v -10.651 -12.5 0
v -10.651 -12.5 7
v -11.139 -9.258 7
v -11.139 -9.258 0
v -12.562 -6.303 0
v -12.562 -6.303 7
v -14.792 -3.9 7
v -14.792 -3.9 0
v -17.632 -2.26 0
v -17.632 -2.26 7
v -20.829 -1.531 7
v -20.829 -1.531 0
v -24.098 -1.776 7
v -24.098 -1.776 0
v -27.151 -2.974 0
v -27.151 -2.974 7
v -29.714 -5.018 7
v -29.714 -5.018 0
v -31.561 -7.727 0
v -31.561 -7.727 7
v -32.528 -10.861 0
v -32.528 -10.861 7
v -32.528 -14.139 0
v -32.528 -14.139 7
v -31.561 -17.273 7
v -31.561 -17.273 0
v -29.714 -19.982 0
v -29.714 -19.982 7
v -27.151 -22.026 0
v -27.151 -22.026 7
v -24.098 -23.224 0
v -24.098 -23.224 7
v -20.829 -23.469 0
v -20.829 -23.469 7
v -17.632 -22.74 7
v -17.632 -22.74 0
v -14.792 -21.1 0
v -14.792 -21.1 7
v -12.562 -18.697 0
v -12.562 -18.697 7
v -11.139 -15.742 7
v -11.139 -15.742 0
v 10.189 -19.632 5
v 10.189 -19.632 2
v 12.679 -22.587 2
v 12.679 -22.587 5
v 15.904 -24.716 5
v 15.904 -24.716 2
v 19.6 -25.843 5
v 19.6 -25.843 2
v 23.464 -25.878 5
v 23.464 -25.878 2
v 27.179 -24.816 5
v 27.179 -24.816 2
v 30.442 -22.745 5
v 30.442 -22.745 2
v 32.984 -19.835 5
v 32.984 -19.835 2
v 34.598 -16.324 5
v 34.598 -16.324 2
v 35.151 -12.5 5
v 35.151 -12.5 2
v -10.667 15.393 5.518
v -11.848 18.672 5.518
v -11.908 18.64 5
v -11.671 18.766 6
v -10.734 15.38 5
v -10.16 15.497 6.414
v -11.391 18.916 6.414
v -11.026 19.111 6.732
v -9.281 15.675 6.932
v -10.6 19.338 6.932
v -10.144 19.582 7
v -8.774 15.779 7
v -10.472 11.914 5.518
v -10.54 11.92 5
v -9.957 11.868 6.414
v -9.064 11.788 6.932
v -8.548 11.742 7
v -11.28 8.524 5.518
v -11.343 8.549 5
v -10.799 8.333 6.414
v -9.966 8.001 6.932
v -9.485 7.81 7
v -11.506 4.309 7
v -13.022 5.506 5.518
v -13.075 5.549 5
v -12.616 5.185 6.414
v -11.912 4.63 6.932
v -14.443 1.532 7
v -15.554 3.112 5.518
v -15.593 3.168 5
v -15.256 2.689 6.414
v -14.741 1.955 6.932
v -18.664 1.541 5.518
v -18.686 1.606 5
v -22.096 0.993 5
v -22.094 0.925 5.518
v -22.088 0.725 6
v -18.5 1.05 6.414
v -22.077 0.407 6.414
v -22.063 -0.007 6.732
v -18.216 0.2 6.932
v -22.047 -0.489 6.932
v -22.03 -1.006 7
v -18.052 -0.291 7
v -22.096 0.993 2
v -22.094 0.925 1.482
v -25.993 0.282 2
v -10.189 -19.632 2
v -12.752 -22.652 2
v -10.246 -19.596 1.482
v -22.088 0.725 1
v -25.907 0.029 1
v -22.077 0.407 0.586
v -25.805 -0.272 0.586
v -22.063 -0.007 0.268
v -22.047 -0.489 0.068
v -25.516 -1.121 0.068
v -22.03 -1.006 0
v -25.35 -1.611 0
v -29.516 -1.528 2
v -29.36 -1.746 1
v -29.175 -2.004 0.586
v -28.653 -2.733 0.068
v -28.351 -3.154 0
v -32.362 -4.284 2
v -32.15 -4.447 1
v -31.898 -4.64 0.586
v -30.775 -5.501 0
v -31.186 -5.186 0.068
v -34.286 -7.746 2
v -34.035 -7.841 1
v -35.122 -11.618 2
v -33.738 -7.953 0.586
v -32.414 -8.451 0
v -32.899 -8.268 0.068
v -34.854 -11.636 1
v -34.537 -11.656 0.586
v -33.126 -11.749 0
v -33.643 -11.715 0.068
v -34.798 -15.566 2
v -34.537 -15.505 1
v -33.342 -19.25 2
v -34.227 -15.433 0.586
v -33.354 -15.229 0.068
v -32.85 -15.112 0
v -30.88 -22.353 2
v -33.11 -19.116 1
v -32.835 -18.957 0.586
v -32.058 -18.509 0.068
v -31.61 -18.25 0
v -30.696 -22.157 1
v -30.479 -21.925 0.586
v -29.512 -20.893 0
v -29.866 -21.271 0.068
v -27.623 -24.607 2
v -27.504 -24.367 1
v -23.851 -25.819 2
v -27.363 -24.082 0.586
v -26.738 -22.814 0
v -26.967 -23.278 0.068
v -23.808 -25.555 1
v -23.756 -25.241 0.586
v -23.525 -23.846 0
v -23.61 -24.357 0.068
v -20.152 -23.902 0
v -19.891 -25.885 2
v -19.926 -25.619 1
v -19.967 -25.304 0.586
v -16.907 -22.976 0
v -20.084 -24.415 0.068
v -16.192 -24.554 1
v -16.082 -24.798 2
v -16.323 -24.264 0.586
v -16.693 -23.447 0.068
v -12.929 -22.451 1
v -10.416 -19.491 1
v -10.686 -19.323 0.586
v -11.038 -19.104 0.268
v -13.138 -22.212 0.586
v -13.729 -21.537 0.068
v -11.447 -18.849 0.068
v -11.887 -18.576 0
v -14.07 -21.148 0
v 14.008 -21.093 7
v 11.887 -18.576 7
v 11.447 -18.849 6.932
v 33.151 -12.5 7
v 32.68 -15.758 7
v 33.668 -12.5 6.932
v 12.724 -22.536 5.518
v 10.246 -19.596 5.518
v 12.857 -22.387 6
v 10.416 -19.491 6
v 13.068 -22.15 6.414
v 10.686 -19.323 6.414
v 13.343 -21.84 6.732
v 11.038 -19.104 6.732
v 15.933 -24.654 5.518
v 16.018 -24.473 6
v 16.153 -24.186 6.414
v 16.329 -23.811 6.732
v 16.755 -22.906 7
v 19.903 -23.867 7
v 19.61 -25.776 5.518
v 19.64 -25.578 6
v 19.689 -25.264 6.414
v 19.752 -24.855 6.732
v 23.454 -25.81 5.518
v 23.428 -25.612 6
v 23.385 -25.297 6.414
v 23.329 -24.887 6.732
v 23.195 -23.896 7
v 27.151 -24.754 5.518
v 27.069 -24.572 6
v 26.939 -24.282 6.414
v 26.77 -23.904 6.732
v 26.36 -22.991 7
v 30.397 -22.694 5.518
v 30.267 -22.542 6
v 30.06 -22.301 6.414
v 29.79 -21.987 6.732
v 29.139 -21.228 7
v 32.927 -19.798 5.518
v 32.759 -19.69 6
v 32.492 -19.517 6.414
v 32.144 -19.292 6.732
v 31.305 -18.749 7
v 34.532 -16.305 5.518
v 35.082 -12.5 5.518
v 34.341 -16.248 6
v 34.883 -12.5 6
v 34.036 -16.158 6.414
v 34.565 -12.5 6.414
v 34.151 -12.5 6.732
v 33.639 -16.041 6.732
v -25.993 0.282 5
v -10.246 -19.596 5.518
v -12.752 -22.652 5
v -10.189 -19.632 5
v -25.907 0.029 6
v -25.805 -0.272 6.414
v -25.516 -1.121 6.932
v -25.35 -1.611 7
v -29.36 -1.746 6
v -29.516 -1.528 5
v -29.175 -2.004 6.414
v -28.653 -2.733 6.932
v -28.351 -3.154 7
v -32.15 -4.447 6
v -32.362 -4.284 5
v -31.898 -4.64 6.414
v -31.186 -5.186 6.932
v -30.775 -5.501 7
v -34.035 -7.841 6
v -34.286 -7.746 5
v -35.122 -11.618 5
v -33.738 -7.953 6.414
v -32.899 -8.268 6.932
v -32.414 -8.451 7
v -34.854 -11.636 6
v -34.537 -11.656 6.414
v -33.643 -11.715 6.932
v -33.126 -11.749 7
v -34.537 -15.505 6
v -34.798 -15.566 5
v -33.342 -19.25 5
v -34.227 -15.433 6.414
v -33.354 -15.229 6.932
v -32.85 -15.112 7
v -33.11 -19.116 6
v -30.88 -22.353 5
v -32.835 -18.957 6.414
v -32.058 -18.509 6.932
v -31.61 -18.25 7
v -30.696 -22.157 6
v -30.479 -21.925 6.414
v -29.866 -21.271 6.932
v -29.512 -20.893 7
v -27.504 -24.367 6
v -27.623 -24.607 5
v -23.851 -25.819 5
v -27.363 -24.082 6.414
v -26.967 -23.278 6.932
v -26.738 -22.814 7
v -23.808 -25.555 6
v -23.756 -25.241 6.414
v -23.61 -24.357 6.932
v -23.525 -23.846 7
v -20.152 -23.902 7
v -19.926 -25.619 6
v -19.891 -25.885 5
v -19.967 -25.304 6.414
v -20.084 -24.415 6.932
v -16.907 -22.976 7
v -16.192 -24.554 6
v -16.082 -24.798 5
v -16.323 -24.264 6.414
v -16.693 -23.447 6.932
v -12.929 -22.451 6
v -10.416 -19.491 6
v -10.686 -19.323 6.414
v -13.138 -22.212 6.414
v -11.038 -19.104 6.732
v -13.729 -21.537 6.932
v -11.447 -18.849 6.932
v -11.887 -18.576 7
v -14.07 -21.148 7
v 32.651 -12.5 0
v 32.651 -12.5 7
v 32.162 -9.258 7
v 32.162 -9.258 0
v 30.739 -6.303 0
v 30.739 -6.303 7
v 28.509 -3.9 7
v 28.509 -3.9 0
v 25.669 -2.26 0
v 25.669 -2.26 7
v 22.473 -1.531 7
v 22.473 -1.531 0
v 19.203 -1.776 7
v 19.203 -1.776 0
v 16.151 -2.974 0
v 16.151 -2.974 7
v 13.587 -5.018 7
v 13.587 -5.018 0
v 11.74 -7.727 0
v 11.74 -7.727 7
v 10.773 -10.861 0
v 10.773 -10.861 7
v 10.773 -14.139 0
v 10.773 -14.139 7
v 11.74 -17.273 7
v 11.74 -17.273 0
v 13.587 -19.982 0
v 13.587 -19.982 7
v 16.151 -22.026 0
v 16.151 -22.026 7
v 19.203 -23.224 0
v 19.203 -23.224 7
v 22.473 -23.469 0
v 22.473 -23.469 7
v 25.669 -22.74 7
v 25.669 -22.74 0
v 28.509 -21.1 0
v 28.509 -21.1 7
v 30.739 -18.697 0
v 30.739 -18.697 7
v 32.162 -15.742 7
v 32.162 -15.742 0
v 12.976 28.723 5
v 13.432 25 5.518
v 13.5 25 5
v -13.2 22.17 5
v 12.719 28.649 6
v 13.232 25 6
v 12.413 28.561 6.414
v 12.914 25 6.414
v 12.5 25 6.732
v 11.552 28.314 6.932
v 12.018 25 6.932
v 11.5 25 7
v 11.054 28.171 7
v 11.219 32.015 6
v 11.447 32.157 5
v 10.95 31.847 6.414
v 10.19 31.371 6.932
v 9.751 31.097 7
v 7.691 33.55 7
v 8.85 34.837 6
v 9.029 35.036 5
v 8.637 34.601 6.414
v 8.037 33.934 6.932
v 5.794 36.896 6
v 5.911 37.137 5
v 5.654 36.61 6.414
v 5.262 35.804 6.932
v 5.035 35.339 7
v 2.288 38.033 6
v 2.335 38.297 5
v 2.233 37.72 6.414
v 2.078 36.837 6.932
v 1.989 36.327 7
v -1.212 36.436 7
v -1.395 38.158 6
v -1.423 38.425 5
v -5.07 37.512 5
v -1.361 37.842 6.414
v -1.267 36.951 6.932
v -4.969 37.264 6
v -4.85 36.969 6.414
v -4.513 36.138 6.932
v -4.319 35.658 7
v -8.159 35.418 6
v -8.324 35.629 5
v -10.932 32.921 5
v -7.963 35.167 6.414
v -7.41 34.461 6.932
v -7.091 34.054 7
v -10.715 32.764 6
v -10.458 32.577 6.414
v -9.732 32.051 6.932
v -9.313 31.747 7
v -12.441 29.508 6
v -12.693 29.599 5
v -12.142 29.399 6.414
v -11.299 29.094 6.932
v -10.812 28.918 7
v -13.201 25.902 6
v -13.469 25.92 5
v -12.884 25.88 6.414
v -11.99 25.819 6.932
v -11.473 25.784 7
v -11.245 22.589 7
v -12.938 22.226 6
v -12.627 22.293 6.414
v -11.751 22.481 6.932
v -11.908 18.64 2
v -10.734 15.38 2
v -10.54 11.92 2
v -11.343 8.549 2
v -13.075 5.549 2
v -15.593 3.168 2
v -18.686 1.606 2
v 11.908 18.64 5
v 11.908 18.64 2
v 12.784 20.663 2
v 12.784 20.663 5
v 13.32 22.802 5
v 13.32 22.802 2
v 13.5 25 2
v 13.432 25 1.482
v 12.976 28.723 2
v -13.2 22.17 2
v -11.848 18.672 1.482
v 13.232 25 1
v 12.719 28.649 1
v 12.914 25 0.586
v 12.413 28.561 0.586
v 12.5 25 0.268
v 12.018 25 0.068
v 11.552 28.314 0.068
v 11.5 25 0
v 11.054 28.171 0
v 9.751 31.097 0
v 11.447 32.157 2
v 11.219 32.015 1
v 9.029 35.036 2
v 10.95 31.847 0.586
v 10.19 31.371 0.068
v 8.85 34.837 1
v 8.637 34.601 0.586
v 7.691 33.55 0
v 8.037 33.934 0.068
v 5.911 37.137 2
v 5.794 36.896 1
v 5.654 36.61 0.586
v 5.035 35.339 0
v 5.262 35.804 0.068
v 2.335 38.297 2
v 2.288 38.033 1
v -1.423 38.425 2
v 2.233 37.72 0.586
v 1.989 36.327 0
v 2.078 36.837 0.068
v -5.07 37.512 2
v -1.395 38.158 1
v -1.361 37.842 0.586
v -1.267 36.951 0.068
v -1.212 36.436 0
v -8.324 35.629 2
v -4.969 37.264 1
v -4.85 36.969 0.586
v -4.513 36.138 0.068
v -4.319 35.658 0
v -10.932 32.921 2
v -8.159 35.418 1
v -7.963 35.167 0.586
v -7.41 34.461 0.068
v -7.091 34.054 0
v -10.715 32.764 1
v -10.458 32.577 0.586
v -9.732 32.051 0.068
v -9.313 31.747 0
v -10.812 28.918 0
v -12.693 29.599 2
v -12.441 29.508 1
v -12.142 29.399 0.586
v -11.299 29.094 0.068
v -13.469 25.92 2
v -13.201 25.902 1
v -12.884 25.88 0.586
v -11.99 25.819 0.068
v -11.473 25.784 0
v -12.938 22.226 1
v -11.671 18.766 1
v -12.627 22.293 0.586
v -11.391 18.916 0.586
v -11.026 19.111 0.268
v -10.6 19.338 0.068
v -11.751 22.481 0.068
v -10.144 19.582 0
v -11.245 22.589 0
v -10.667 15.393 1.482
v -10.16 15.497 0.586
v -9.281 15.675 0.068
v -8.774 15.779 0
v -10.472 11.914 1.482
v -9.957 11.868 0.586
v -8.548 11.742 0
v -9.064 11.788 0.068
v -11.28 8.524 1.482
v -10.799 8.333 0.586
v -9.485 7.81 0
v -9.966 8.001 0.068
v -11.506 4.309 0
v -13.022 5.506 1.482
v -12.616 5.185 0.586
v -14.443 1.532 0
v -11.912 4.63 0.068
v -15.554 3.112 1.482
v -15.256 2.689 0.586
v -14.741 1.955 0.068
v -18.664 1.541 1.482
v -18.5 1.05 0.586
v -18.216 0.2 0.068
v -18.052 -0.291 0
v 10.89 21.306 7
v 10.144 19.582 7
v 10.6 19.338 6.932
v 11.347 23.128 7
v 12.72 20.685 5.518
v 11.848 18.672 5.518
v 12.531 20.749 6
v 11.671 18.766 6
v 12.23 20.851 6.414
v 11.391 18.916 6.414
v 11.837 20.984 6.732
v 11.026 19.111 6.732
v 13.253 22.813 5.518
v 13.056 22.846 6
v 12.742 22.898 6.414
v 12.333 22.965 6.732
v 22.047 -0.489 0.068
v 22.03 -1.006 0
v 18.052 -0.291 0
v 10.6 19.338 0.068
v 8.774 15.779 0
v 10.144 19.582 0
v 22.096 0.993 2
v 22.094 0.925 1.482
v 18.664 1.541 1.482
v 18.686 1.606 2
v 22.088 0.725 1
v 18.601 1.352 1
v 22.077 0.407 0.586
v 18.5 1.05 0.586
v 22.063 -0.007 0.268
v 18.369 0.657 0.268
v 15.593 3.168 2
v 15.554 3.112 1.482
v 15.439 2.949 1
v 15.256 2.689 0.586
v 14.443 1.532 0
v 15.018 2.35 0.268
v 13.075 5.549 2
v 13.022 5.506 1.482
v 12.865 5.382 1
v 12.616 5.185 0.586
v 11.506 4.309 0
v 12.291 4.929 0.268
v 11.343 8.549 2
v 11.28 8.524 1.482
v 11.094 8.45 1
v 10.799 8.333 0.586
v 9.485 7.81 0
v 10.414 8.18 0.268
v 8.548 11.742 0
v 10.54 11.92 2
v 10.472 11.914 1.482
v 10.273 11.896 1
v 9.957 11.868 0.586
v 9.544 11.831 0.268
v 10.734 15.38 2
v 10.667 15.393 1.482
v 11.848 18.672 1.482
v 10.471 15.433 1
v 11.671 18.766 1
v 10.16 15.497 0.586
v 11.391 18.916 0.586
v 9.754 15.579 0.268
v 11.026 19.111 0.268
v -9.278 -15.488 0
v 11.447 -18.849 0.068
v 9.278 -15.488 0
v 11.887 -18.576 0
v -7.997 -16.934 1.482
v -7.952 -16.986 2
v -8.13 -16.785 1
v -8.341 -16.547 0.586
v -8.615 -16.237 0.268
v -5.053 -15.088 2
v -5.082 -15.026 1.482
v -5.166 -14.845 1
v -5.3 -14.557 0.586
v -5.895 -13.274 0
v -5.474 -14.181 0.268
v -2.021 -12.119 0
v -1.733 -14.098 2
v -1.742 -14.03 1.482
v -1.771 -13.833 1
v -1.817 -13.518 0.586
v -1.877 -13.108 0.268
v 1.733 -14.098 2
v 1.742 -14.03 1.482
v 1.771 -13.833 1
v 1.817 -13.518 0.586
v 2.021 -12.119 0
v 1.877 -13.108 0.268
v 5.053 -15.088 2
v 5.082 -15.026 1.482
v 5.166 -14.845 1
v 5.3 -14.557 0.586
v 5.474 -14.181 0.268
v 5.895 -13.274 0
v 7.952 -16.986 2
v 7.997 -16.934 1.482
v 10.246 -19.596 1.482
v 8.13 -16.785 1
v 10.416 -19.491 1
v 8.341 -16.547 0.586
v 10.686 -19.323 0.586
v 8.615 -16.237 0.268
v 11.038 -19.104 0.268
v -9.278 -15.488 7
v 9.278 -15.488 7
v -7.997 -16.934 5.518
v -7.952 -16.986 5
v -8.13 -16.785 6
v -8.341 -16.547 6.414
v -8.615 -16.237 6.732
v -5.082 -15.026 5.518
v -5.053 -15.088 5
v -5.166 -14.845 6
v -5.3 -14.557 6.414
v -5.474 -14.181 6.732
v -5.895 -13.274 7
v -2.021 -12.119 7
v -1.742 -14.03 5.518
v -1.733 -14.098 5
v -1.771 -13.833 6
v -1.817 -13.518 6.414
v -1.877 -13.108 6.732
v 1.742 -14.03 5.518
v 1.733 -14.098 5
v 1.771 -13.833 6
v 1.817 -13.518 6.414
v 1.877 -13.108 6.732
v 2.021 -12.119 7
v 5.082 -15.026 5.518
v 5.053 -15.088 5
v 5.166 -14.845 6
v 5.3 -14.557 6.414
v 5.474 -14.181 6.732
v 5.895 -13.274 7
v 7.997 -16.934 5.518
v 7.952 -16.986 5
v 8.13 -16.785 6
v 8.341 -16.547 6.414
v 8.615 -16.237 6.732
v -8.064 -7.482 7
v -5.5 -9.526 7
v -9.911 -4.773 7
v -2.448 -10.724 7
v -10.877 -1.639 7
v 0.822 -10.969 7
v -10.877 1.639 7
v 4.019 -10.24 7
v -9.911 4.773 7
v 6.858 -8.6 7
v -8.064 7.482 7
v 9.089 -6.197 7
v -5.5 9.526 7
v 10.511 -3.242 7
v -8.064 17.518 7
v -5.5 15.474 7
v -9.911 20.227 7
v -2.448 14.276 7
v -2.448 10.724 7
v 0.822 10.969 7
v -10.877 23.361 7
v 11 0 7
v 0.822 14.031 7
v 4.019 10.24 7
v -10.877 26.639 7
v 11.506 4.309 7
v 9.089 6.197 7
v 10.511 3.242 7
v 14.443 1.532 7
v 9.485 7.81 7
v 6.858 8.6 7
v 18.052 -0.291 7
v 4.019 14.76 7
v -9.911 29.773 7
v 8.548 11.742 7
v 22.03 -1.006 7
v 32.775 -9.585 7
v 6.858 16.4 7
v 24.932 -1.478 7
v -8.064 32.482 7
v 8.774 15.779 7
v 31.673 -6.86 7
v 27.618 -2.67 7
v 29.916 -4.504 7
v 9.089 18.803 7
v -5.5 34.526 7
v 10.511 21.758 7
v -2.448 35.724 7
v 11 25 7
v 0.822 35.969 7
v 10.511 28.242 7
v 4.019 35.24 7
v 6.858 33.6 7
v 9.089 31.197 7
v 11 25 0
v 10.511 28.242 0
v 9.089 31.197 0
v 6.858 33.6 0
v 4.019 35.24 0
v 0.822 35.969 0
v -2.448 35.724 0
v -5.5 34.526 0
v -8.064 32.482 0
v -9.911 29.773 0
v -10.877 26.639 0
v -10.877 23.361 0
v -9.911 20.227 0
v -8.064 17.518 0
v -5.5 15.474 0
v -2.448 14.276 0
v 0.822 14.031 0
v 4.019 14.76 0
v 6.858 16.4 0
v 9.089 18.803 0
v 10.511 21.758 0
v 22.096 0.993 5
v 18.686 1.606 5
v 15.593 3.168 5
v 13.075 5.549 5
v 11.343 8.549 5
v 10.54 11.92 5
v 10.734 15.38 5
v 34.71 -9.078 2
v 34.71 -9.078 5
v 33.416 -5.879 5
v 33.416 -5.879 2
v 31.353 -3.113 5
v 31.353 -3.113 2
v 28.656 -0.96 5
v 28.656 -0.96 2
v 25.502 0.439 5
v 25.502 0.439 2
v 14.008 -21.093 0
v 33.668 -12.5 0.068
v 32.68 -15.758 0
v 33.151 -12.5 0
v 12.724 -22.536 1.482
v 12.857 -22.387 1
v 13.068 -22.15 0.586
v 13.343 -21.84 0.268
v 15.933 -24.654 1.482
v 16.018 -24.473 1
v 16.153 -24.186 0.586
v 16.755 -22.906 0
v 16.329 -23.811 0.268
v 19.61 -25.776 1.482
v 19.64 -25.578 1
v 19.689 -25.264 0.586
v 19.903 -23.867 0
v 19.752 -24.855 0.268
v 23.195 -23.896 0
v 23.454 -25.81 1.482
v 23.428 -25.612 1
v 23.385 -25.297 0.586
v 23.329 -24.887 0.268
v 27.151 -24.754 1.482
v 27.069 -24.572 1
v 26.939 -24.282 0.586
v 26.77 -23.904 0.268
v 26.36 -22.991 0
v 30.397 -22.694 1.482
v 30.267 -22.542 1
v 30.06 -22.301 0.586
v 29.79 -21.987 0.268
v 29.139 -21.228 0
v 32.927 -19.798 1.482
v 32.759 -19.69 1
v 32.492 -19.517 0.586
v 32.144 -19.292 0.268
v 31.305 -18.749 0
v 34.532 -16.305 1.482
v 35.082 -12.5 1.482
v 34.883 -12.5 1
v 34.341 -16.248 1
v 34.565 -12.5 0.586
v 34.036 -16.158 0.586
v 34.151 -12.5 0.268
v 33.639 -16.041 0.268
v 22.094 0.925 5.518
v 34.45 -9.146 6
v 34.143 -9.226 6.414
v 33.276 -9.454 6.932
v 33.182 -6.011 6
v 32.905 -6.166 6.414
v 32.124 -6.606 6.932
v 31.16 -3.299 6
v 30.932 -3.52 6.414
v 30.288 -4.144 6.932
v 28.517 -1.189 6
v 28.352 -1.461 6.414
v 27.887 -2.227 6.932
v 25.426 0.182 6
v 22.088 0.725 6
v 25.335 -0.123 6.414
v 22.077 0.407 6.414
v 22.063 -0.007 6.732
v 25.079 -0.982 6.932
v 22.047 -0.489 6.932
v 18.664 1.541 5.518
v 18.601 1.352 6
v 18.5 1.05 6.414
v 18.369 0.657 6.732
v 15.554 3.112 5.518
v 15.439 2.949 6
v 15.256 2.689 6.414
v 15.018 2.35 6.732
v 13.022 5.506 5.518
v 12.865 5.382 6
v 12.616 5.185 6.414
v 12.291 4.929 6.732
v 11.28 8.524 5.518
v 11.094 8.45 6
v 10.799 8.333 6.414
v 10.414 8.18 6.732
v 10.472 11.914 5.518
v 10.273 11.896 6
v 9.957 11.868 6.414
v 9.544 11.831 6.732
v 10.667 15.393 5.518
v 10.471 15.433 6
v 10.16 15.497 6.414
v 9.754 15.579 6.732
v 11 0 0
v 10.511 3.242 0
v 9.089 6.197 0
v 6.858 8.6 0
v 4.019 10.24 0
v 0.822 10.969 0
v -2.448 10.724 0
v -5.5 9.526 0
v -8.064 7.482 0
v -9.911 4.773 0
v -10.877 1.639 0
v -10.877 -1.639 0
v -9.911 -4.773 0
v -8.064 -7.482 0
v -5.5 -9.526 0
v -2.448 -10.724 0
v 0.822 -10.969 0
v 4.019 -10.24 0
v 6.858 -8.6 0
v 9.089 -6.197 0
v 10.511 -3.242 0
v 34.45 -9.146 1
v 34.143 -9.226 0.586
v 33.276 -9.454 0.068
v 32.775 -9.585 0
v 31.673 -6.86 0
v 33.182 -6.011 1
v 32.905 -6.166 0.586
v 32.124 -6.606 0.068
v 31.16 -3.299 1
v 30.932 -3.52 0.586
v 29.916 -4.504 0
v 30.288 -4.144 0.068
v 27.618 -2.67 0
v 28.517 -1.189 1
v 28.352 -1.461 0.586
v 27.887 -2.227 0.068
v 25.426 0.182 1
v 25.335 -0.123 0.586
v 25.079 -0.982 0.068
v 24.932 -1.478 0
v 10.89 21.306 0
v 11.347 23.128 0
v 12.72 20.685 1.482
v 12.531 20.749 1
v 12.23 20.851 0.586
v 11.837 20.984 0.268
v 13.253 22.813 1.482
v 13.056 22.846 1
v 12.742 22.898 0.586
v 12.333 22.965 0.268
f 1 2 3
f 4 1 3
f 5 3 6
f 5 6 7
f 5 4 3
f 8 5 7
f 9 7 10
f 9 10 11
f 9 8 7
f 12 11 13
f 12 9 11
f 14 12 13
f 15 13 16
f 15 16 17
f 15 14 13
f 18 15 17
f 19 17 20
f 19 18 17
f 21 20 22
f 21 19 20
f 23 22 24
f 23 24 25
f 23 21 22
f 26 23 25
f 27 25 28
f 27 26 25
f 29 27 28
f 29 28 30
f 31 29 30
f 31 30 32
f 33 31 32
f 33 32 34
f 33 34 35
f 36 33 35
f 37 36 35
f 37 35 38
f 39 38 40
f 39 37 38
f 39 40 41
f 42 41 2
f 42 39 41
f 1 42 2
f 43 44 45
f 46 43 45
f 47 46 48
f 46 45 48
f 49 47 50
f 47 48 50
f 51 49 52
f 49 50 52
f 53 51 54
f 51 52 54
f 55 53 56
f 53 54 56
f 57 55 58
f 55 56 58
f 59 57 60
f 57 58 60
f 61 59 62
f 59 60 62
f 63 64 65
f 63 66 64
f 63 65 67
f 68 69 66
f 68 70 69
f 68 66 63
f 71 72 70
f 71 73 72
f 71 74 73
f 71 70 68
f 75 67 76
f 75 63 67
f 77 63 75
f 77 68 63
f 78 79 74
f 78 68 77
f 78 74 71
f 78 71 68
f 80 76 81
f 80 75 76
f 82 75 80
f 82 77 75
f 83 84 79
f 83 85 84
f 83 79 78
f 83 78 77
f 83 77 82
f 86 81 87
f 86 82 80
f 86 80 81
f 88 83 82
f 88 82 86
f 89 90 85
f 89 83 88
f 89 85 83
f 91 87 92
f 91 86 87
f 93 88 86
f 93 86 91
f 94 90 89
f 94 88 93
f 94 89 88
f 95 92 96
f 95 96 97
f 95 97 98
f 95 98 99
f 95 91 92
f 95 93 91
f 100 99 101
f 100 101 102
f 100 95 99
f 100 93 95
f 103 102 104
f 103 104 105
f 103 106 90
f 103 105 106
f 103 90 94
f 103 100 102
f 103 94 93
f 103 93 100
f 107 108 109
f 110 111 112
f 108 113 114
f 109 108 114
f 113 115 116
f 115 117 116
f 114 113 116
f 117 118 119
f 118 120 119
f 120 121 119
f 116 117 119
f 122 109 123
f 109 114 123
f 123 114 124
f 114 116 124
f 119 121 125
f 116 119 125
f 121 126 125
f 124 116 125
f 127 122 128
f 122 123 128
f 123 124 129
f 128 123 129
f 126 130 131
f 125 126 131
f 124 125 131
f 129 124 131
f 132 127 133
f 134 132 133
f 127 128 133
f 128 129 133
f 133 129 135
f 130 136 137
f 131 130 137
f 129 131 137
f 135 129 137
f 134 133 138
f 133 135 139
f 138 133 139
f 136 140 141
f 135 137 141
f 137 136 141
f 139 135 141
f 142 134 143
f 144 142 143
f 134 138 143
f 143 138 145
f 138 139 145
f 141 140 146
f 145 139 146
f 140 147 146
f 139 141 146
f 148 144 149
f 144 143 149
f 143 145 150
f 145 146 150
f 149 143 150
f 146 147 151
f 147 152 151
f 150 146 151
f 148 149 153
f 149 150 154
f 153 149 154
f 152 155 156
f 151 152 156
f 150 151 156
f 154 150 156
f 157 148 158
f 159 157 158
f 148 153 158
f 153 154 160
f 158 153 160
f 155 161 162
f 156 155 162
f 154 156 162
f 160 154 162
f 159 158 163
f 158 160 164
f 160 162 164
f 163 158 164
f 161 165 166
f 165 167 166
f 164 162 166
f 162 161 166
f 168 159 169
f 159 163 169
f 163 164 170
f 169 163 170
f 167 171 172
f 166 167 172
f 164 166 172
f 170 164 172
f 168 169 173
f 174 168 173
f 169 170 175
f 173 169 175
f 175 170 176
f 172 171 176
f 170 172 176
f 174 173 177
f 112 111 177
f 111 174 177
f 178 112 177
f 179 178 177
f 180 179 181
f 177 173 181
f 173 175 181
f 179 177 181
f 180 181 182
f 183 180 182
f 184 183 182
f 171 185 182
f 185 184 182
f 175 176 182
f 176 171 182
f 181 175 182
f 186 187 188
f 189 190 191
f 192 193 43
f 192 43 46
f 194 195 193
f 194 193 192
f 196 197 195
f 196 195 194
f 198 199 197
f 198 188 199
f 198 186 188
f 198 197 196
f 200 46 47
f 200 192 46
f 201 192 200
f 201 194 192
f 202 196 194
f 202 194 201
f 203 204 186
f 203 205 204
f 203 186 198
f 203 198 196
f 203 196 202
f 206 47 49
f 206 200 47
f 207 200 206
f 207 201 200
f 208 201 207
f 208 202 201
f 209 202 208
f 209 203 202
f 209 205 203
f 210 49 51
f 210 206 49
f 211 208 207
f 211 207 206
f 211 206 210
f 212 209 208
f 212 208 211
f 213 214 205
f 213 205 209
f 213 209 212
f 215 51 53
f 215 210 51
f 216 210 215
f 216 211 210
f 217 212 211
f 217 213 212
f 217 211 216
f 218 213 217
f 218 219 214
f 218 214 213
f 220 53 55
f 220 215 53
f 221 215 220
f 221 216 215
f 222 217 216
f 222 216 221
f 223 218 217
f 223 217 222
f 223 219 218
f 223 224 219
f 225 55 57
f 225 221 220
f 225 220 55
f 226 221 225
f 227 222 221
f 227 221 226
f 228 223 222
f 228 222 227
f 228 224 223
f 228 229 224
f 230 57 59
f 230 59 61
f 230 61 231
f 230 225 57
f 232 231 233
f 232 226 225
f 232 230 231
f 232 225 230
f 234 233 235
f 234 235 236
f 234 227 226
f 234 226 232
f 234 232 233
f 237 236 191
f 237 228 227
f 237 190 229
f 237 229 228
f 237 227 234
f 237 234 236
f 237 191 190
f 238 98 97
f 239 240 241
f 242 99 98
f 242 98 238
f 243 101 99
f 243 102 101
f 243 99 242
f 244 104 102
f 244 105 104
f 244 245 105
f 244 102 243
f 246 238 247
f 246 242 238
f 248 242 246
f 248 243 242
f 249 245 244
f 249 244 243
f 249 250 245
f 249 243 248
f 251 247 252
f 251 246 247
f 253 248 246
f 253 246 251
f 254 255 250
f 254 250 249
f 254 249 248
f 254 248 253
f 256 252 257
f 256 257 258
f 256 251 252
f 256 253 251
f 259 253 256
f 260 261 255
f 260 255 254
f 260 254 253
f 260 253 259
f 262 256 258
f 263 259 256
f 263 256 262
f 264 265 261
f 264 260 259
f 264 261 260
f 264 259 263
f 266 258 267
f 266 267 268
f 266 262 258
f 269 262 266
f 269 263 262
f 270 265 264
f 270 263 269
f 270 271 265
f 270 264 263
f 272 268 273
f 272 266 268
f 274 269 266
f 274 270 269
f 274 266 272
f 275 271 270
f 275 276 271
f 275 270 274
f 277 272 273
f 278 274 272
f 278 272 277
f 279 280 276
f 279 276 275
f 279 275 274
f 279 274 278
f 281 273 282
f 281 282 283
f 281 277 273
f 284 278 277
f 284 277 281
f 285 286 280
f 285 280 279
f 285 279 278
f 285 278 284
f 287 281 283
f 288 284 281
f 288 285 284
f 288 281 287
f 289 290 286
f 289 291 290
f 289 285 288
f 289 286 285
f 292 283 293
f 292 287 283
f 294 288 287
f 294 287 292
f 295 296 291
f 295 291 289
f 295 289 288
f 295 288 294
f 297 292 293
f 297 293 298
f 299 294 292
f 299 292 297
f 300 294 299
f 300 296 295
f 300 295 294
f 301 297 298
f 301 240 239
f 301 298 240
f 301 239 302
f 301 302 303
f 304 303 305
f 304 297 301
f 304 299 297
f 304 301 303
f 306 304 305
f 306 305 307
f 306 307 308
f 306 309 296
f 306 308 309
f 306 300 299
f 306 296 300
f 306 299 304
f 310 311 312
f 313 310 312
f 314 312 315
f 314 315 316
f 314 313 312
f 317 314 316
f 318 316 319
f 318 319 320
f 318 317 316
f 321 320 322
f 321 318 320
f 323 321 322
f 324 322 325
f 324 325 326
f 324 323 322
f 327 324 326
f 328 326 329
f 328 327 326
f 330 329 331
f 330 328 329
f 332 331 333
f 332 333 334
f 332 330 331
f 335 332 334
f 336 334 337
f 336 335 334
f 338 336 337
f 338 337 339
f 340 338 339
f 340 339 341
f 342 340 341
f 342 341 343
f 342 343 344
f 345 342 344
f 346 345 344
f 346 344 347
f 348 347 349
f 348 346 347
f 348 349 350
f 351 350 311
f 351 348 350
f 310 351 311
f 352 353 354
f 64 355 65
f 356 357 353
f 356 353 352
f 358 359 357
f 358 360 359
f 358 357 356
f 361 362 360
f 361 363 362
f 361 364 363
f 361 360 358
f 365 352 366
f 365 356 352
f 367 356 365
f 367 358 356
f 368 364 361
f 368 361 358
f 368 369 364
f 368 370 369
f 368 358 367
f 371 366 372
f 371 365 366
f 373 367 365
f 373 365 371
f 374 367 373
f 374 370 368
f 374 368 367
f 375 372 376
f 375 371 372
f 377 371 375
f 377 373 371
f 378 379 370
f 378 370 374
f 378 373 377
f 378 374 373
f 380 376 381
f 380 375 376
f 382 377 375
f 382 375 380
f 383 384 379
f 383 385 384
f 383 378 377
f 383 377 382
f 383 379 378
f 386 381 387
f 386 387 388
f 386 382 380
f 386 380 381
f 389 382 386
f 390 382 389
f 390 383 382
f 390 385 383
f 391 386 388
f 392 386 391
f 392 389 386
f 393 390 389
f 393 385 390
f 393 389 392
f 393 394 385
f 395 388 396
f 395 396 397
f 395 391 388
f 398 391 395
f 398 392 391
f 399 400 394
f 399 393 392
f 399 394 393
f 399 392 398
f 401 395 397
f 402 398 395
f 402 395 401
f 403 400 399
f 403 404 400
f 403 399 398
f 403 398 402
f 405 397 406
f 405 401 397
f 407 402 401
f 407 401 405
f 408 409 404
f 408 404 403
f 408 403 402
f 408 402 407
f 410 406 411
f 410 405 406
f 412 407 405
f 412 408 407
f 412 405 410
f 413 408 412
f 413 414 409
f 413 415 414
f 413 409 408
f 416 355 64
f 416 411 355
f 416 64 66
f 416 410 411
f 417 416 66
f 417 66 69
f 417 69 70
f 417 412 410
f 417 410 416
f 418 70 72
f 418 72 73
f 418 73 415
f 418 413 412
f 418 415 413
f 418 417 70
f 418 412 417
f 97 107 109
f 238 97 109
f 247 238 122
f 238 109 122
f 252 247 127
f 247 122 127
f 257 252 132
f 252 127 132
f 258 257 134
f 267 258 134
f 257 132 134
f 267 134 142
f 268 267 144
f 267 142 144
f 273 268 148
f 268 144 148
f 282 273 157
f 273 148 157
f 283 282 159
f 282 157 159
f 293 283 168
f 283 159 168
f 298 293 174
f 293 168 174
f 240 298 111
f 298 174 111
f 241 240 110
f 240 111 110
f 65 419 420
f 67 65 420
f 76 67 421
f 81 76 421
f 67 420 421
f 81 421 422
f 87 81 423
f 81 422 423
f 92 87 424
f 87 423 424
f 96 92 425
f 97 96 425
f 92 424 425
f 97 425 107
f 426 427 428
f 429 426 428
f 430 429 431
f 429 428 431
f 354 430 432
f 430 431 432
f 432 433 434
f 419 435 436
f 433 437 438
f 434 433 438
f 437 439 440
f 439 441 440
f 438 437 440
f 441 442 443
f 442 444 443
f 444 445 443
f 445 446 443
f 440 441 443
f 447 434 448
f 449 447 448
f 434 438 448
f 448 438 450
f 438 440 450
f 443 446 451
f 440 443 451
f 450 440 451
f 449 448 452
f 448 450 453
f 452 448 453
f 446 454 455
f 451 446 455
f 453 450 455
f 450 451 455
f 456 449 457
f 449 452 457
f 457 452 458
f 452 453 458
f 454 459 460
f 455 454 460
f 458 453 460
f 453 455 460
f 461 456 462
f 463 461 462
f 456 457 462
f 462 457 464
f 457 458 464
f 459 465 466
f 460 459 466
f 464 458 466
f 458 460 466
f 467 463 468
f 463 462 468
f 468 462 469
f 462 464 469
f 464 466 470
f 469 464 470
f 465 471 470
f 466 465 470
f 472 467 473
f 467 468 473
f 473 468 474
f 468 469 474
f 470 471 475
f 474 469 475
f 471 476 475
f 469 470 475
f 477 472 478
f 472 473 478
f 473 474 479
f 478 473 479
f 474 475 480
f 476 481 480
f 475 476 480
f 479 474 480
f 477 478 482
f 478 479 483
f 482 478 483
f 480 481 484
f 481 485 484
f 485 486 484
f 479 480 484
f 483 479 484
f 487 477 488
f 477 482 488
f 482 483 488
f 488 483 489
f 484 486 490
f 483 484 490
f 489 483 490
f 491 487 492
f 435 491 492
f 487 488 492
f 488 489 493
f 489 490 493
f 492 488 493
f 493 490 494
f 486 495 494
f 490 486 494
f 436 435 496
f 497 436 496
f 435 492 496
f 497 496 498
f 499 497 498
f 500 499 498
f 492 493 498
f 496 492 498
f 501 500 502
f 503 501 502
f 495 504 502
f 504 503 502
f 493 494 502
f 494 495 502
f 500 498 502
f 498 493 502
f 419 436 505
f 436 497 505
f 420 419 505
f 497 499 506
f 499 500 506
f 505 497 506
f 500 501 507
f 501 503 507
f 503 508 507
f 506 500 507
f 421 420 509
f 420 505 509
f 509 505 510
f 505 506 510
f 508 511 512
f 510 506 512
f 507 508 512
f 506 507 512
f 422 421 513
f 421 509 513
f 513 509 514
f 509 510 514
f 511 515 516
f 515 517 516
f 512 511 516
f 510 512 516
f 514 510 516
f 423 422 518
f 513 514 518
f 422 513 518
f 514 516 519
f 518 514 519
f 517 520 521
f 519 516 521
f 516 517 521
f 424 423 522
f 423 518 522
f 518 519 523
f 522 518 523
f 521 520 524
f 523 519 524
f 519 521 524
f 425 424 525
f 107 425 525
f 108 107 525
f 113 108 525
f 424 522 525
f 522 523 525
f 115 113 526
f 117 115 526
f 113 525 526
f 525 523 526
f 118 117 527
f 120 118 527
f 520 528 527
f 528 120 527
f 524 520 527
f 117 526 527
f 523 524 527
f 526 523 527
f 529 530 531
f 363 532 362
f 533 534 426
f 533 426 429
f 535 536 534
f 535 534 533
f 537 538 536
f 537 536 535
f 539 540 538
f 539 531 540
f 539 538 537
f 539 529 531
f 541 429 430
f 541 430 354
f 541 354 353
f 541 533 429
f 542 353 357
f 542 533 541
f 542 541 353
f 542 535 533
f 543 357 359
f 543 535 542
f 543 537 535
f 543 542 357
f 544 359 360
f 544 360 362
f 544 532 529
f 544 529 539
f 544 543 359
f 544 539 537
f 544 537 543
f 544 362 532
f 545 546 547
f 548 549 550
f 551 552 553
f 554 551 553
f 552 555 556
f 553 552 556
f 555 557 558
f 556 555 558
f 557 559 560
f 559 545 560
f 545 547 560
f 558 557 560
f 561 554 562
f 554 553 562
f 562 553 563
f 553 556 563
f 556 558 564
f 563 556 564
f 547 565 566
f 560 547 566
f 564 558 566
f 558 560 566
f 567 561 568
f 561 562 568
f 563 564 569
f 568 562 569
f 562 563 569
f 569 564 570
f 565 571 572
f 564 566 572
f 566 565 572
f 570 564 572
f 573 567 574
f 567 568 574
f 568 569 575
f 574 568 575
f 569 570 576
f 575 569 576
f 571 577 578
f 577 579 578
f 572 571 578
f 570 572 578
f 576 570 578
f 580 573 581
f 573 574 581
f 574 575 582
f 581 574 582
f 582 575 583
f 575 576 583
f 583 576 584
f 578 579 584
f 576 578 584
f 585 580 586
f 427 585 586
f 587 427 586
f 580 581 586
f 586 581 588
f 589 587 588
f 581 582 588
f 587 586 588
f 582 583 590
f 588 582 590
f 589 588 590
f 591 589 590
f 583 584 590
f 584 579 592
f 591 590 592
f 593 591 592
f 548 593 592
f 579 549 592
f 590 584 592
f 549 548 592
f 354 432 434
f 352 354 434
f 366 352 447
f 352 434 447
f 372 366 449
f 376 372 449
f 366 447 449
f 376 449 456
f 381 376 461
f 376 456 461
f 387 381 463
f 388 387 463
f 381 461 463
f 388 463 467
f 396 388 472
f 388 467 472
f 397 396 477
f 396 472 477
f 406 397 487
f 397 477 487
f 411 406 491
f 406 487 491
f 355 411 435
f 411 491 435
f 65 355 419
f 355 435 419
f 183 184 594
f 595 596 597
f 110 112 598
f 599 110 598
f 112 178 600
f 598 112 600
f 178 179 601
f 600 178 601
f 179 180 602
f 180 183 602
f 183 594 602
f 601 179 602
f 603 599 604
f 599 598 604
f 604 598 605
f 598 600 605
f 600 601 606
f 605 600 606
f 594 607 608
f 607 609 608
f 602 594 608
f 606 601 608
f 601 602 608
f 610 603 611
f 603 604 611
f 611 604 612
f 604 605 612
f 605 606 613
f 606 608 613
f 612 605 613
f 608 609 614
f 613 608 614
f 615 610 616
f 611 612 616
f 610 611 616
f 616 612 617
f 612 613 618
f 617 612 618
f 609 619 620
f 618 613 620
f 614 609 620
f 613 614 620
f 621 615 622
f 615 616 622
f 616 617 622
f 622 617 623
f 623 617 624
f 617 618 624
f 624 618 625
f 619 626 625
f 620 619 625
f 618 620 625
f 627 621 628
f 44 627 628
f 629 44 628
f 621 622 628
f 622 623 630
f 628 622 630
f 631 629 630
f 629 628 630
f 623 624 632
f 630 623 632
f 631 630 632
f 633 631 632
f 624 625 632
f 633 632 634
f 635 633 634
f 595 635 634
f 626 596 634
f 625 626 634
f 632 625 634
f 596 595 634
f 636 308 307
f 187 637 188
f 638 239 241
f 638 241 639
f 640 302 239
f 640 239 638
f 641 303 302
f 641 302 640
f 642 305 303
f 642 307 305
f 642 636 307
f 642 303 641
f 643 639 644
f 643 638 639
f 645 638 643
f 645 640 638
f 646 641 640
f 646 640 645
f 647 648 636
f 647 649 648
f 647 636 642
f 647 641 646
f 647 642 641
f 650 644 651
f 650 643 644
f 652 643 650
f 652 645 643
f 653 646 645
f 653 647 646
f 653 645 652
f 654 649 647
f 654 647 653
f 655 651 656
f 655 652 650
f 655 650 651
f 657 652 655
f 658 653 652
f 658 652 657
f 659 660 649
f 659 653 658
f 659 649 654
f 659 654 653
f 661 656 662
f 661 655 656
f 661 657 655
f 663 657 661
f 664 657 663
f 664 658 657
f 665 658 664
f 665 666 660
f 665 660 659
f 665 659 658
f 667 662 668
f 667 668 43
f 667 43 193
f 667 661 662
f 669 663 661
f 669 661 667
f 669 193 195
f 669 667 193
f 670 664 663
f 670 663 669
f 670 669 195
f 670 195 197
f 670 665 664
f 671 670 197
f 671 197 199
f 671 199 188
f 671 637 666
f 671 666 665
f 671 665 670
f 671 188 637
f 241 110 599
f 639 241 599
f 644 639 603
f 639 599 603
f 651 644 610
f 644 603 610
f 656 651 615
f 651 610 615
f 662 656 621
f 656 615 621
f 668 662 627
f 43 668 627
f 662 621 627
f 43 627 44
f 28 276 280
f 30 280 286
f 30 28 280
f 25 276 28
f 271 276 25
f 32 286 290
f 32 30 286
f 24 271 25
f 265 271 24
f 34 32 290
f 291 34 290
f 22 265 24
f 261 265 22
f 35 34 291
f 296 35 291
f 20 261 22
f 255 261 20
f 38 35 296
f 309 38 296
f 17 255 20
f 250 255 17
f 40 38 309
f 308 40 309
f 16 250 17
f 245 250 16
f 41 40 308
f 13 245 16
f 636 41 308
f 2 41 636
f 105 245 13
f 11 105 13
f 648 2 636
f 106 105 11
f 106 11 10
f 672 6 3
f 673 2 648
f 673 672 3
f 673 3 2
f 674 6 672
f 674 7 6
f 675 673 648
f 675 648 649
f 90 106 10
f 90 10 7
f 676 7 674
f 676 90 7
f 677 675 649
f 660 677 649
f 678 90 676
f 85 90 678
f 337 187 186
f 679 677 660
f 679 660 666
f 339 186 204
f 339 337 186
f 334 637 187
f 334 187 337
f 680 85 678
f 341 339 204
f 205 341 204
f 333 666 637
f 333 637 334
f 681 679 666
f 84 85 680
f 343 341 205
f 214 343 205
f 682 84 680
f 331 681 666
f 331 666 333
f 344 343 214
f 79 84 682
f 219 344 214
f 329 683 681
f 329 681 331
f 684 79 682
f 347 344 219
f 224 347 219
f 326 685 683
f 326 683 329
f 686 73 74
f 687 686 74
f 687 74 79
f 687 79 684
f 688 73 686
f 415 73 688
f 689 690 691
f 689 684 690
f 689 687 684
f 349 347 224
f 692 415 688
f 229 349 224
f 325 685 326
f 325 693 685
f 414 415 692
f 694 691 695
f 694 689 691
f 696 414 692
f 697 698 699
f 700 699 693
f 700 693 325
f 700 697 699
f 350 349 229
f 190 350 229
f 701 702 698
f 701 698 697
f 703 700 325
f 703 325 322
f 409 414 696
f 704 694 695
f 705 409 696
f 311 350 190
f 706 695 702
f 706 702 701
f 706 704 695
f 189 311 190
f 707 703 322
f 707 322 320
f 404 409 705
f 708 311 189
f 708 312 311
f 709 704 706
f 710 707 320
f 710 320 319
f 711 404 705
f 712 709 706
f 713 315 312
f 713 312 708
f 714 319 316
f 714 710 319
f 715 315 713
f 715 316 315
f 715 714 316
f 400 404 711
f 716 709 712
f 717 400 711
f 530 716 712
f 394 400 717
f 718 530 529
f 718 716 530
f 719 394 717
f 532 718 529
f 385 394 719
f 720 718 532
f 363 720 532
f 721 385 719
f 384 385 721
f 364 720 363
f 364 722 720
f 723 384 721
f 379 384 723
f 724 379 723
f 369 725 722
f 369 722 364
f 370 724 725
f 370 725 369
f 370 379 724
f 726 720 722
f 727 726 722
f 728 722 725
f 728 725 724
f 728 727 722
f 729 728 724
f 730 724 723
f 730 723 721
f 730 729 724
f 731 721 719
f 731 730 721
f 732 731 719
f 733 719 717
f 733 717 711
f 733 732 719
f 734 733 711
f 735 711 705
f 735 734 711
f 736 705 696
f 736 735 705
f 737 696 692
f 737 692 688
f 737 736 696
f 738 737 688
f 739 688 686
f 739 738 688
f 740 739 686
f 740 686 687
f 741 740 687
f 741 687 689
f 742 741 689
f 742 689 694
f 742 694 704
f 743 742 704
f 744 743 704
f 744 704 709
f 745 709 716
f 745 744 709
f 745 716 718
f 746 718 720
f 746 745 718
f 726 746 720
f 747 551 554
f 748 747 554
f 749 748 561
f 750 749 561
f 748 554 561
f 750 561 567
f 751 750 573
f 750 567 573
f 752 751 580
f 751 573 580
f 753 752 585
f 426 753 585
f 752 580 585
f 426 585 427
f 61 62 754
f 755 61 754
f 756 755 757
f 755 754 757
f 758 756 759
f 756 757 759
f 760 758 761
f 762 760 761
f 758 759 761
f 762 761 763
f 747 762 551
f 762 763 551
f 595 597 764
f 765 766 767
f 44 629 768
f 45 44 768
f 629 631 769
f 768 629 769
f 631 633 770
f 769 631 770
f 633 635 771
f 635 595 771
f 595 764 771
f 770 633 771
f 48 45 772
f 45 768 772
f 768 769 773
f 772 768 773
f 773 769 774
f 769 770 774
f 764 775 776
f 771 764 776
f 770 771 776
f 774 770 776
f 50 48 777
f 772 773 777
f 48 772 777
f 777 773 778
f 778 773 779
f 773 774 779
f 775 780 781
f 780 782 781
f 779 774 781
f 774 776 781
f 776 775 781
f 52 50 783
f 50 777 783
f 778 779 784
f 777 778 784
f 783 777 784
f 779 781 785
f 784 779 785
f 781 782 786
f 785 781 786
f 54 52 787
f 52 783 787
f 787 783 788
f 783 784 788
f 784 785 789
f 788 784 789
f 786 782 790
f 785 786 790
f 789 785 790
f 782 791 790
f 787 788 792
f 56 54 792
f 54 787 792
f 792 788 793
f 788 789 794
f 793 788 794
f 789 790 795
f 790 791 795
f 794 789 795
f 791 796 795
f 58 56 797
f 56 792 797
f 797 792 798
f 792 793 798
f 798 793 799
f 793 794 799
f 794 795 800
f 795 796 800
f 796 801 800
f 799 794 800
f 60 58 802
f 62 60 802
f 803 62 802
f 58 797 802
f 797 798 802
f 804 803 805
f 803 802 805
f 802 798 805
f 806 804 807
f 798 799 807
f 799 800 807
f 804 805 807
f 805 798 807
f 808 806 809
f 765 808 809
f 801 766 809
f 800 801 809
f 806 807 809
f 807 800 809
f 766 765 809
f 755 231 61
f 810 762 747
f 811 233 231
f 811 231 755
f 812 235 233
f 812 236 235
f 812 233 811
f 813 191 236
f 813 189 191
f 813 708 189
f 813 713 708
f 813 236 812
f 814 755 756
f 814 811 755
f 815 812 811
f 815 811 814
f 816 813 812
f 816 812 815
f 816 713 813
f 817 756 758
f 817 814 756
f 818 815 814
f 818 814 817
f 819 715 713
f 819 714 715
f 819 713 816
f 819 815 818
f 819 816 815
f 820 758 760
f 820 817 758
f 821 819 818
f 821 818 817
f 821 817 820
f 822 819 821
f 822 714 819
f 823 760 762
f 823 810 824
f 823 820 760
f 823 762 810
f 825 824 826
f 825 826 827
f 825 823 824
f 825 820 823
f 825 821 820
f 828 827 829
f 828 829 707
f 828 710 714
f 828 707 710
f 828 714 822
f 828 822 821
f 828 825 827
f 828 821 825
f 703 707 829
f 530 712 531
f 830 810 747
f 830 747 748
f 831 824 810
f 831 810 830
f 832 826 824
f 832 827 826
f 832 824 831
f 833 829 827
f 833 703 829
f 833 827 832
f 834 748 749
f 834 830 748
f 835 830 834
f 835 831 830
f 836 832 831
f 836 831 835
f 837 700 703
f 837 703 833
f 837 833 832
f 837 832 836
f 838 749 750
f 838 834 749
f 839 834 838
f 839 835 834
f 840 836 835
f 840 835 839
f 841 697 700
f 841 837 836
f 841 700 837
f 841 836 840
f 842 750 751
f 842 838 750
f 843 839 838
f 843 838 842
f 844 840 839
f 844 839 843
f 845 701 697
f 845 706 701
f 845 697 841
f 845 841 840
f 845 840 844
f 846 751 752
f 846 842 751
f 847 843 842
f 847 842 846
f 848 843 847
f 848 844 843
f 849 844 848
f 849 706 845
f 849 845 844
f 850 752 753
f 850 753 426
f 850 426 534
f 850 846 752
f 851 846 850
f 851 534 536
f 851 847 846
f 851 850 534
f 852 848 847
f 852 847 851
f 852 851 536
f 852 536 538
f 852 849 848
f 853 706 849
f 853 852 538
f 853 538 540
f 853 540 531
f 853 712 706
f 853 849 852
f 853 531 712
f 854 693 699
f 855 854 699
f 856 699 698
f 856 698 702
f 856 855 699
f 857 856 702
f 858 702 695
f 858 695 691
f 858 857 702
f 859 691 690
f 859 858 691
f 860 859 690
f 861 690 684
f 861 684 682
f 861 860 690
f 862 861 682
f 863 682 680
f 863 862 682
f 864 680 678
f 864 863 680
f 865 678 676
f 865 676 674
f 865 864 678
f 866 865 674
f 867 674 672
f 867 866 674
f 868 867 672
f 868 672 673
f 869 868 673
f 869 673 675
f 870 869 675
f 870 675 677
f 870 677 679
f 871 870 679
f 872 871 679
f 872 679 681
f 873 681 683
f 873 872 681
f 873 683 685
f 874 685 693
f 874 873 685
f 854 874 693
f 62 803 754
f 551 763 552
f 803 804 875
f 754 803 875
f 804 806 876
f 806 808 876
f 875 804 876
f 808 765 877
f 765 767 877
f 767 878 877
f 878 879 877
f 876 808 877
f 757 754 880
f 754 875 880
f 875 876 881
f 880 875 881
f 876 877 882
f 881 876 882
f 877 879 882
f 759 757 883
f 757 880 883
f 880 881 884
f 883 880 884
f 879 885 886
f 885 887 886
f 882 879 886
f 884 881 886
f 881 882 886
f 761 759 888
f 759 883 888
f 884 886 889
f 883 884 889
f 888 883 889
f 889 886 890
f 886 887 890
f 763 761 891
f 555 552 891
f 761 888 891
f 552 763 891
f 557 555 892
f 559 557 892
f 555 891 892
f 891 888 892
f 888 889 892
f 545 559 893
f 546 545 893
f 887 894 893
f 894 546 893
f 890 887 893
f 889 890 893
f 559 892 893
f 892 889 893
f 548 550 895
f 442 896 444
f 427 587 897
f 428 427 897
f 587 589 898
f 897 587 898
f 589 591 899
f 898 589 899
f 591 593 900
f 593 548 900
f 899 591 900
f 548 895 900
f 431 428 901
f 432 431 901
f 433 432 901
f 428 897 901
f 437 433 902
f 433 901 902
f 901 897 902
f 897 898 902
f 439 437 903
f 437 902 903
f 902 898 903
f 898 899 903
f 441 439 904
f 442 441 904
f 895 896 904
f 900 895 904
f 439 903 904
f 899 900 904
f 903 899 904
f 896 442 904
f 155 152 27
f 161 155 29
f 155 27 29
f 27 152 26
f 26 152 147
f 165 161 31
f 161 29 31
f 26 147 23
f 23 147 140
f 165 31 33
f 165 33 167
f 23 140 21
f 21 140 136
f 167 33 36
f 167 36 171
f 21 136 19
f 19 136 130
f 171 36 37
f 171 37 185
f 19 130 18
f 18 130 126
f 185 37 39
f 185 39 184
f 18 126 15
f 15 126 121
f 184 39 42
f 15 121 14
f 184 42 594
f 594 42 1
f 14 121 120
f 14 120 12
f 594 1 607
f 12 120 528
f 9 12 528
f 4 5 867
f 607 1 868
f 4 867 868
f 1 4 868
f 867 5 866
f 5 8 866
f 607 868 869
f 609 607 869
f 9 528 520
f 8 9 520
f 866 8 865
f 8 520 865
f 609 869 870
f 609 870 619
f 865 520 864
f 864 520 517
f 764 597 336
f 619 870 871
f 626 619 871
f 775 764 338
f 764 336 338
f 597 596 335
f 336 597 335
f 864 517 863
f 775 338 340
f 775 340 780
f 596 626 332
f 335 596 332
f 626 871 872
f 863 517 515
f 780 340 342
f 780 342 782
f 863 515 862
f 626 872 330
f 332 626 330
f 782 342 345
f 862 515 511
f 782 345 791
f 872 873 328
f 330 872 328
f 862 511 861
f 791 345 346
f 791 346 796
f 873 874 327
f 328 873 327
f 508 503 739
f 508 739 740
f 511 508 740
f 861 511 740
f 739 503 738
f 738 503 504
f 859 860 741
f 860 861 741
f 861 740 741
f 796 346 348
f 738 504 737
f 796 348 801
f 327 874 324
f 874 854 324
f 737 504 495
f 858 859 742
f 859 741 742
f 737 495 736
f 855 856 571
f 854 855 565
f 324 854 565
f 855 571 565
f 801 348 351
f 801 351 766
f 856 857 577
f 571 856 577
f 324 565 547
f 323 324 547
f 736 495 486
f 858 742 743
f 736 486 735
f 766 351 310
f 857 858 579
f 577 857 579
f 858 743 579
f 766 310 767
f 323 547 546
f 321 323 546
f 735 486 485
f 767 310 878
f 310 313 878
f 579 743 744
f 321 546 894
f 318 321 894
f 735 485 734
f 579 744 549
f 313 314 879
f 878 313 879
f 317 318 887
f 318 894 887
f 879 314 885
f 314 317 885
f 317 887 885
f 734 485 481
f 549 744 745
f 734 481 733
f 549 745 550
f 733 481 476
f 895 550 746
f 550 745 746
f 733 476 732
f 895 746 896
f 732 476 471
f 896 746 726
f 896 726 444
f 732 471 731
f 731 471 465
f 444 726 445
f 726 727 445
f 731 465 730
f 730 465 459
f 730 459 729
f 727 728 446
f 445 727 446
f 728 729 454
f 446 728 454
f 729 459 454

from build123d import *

# Parameters (mm, degrees)
F0_R     = 11
F1_DEPTH = 7
F2_R     = 2


with BuildPart() as f1:
    # F0 (on Top) → F1 (new body)
    with BuildSketch(Plane.XY):
        with BuildLine():
            ThreePointArc((11.907836, 18.639698), (13.095911, 21.721722), (13.5, 25))
            ThreePointArc((13.5, 25), (-3.278278, 38.095911), (-11.907836, 18.639698))
            ThreePointArc((-11.907836, 18.639698), (0, 11.5), (11.907836, 18.639698))
        make_face()
        with Locations((0, 25)):
            Circle(F0_R, mode=Mode.SUBTRACT)
        with BuildLine():
            ThreePointArc((11.907836, 18.639698), (0, 11.5), (-11.907836, 18.639698))
            ThreePointArc((-11.907836, 18.639698), (-12.100275, 6.986097), (-22.09637, 0.992639))
            ThreePointArc((-22.09637, 0.992639), (-12.263607, -2.797747), (-8.150635, -12.5))
            ThreePointArc((-8.150635, -12.5), (-8.670104, -16.208884), (-10.188534, -19.632338))
            ThreePointArc((-10.188534, -19.632338), (0, -13.972194), (10.188534, -19.632338))
            ThreePointArc((10.188534, -19.632338), (9.959292, -5.75), (22.09637, 0.992639))
            ThreePointArc((22.09637, 0.992639), (12.100275, 6.986097), (11.907836, 18.639698))
        make_face()
        Circle(F0_R, mode=Mode.SUBTRACT)
        with BuildLine():
            ThreePointArc((-8.150635, -12.5), (-12.263607, -2.797747), (-22.09637, 0.992639))
            ThreePointArc((-22.09637, 0.992639), (-33.341978, -19.25), (-10.188534, -19.632338))
            ThreePointArc((-10.188534, -19.632338), (-8.670104, -16.208884), (-8.150635, -12.5))
        make_face()
        with Locations((-21.650635, -12.5)):
            Circle(F0_R, mode=Mode.SUBTRACT)
        with BuildLine():
            ThreePointArc((35.150635, -12.5), (31.352888, -3.112972), (22.09637, 0.992639))
            ThreePointArc((22.09637, 0.992639), (9.959292, -5.75), (10.188534, -19.632338))
            ThreePointArc((10.188534, -19.632338), (25.359519, -25.480531), (35.150635, -12.5))
        make_face()
        with Locations((21.650635, -12.5)):
            Circle(F0_R, mode=Mode.SUBTRACT)
    extrude(amount=F1_DEPTH)

    # F2
    f2_edges = [f1.edges().sort_by_distance(p)[0] for p in [
        (-33.341978, -19.25, 7),
        (-33.341978, -19.25, 0),
    ]]
    fillet(f2_edges, radius=F2_R)


solid = f1.part
